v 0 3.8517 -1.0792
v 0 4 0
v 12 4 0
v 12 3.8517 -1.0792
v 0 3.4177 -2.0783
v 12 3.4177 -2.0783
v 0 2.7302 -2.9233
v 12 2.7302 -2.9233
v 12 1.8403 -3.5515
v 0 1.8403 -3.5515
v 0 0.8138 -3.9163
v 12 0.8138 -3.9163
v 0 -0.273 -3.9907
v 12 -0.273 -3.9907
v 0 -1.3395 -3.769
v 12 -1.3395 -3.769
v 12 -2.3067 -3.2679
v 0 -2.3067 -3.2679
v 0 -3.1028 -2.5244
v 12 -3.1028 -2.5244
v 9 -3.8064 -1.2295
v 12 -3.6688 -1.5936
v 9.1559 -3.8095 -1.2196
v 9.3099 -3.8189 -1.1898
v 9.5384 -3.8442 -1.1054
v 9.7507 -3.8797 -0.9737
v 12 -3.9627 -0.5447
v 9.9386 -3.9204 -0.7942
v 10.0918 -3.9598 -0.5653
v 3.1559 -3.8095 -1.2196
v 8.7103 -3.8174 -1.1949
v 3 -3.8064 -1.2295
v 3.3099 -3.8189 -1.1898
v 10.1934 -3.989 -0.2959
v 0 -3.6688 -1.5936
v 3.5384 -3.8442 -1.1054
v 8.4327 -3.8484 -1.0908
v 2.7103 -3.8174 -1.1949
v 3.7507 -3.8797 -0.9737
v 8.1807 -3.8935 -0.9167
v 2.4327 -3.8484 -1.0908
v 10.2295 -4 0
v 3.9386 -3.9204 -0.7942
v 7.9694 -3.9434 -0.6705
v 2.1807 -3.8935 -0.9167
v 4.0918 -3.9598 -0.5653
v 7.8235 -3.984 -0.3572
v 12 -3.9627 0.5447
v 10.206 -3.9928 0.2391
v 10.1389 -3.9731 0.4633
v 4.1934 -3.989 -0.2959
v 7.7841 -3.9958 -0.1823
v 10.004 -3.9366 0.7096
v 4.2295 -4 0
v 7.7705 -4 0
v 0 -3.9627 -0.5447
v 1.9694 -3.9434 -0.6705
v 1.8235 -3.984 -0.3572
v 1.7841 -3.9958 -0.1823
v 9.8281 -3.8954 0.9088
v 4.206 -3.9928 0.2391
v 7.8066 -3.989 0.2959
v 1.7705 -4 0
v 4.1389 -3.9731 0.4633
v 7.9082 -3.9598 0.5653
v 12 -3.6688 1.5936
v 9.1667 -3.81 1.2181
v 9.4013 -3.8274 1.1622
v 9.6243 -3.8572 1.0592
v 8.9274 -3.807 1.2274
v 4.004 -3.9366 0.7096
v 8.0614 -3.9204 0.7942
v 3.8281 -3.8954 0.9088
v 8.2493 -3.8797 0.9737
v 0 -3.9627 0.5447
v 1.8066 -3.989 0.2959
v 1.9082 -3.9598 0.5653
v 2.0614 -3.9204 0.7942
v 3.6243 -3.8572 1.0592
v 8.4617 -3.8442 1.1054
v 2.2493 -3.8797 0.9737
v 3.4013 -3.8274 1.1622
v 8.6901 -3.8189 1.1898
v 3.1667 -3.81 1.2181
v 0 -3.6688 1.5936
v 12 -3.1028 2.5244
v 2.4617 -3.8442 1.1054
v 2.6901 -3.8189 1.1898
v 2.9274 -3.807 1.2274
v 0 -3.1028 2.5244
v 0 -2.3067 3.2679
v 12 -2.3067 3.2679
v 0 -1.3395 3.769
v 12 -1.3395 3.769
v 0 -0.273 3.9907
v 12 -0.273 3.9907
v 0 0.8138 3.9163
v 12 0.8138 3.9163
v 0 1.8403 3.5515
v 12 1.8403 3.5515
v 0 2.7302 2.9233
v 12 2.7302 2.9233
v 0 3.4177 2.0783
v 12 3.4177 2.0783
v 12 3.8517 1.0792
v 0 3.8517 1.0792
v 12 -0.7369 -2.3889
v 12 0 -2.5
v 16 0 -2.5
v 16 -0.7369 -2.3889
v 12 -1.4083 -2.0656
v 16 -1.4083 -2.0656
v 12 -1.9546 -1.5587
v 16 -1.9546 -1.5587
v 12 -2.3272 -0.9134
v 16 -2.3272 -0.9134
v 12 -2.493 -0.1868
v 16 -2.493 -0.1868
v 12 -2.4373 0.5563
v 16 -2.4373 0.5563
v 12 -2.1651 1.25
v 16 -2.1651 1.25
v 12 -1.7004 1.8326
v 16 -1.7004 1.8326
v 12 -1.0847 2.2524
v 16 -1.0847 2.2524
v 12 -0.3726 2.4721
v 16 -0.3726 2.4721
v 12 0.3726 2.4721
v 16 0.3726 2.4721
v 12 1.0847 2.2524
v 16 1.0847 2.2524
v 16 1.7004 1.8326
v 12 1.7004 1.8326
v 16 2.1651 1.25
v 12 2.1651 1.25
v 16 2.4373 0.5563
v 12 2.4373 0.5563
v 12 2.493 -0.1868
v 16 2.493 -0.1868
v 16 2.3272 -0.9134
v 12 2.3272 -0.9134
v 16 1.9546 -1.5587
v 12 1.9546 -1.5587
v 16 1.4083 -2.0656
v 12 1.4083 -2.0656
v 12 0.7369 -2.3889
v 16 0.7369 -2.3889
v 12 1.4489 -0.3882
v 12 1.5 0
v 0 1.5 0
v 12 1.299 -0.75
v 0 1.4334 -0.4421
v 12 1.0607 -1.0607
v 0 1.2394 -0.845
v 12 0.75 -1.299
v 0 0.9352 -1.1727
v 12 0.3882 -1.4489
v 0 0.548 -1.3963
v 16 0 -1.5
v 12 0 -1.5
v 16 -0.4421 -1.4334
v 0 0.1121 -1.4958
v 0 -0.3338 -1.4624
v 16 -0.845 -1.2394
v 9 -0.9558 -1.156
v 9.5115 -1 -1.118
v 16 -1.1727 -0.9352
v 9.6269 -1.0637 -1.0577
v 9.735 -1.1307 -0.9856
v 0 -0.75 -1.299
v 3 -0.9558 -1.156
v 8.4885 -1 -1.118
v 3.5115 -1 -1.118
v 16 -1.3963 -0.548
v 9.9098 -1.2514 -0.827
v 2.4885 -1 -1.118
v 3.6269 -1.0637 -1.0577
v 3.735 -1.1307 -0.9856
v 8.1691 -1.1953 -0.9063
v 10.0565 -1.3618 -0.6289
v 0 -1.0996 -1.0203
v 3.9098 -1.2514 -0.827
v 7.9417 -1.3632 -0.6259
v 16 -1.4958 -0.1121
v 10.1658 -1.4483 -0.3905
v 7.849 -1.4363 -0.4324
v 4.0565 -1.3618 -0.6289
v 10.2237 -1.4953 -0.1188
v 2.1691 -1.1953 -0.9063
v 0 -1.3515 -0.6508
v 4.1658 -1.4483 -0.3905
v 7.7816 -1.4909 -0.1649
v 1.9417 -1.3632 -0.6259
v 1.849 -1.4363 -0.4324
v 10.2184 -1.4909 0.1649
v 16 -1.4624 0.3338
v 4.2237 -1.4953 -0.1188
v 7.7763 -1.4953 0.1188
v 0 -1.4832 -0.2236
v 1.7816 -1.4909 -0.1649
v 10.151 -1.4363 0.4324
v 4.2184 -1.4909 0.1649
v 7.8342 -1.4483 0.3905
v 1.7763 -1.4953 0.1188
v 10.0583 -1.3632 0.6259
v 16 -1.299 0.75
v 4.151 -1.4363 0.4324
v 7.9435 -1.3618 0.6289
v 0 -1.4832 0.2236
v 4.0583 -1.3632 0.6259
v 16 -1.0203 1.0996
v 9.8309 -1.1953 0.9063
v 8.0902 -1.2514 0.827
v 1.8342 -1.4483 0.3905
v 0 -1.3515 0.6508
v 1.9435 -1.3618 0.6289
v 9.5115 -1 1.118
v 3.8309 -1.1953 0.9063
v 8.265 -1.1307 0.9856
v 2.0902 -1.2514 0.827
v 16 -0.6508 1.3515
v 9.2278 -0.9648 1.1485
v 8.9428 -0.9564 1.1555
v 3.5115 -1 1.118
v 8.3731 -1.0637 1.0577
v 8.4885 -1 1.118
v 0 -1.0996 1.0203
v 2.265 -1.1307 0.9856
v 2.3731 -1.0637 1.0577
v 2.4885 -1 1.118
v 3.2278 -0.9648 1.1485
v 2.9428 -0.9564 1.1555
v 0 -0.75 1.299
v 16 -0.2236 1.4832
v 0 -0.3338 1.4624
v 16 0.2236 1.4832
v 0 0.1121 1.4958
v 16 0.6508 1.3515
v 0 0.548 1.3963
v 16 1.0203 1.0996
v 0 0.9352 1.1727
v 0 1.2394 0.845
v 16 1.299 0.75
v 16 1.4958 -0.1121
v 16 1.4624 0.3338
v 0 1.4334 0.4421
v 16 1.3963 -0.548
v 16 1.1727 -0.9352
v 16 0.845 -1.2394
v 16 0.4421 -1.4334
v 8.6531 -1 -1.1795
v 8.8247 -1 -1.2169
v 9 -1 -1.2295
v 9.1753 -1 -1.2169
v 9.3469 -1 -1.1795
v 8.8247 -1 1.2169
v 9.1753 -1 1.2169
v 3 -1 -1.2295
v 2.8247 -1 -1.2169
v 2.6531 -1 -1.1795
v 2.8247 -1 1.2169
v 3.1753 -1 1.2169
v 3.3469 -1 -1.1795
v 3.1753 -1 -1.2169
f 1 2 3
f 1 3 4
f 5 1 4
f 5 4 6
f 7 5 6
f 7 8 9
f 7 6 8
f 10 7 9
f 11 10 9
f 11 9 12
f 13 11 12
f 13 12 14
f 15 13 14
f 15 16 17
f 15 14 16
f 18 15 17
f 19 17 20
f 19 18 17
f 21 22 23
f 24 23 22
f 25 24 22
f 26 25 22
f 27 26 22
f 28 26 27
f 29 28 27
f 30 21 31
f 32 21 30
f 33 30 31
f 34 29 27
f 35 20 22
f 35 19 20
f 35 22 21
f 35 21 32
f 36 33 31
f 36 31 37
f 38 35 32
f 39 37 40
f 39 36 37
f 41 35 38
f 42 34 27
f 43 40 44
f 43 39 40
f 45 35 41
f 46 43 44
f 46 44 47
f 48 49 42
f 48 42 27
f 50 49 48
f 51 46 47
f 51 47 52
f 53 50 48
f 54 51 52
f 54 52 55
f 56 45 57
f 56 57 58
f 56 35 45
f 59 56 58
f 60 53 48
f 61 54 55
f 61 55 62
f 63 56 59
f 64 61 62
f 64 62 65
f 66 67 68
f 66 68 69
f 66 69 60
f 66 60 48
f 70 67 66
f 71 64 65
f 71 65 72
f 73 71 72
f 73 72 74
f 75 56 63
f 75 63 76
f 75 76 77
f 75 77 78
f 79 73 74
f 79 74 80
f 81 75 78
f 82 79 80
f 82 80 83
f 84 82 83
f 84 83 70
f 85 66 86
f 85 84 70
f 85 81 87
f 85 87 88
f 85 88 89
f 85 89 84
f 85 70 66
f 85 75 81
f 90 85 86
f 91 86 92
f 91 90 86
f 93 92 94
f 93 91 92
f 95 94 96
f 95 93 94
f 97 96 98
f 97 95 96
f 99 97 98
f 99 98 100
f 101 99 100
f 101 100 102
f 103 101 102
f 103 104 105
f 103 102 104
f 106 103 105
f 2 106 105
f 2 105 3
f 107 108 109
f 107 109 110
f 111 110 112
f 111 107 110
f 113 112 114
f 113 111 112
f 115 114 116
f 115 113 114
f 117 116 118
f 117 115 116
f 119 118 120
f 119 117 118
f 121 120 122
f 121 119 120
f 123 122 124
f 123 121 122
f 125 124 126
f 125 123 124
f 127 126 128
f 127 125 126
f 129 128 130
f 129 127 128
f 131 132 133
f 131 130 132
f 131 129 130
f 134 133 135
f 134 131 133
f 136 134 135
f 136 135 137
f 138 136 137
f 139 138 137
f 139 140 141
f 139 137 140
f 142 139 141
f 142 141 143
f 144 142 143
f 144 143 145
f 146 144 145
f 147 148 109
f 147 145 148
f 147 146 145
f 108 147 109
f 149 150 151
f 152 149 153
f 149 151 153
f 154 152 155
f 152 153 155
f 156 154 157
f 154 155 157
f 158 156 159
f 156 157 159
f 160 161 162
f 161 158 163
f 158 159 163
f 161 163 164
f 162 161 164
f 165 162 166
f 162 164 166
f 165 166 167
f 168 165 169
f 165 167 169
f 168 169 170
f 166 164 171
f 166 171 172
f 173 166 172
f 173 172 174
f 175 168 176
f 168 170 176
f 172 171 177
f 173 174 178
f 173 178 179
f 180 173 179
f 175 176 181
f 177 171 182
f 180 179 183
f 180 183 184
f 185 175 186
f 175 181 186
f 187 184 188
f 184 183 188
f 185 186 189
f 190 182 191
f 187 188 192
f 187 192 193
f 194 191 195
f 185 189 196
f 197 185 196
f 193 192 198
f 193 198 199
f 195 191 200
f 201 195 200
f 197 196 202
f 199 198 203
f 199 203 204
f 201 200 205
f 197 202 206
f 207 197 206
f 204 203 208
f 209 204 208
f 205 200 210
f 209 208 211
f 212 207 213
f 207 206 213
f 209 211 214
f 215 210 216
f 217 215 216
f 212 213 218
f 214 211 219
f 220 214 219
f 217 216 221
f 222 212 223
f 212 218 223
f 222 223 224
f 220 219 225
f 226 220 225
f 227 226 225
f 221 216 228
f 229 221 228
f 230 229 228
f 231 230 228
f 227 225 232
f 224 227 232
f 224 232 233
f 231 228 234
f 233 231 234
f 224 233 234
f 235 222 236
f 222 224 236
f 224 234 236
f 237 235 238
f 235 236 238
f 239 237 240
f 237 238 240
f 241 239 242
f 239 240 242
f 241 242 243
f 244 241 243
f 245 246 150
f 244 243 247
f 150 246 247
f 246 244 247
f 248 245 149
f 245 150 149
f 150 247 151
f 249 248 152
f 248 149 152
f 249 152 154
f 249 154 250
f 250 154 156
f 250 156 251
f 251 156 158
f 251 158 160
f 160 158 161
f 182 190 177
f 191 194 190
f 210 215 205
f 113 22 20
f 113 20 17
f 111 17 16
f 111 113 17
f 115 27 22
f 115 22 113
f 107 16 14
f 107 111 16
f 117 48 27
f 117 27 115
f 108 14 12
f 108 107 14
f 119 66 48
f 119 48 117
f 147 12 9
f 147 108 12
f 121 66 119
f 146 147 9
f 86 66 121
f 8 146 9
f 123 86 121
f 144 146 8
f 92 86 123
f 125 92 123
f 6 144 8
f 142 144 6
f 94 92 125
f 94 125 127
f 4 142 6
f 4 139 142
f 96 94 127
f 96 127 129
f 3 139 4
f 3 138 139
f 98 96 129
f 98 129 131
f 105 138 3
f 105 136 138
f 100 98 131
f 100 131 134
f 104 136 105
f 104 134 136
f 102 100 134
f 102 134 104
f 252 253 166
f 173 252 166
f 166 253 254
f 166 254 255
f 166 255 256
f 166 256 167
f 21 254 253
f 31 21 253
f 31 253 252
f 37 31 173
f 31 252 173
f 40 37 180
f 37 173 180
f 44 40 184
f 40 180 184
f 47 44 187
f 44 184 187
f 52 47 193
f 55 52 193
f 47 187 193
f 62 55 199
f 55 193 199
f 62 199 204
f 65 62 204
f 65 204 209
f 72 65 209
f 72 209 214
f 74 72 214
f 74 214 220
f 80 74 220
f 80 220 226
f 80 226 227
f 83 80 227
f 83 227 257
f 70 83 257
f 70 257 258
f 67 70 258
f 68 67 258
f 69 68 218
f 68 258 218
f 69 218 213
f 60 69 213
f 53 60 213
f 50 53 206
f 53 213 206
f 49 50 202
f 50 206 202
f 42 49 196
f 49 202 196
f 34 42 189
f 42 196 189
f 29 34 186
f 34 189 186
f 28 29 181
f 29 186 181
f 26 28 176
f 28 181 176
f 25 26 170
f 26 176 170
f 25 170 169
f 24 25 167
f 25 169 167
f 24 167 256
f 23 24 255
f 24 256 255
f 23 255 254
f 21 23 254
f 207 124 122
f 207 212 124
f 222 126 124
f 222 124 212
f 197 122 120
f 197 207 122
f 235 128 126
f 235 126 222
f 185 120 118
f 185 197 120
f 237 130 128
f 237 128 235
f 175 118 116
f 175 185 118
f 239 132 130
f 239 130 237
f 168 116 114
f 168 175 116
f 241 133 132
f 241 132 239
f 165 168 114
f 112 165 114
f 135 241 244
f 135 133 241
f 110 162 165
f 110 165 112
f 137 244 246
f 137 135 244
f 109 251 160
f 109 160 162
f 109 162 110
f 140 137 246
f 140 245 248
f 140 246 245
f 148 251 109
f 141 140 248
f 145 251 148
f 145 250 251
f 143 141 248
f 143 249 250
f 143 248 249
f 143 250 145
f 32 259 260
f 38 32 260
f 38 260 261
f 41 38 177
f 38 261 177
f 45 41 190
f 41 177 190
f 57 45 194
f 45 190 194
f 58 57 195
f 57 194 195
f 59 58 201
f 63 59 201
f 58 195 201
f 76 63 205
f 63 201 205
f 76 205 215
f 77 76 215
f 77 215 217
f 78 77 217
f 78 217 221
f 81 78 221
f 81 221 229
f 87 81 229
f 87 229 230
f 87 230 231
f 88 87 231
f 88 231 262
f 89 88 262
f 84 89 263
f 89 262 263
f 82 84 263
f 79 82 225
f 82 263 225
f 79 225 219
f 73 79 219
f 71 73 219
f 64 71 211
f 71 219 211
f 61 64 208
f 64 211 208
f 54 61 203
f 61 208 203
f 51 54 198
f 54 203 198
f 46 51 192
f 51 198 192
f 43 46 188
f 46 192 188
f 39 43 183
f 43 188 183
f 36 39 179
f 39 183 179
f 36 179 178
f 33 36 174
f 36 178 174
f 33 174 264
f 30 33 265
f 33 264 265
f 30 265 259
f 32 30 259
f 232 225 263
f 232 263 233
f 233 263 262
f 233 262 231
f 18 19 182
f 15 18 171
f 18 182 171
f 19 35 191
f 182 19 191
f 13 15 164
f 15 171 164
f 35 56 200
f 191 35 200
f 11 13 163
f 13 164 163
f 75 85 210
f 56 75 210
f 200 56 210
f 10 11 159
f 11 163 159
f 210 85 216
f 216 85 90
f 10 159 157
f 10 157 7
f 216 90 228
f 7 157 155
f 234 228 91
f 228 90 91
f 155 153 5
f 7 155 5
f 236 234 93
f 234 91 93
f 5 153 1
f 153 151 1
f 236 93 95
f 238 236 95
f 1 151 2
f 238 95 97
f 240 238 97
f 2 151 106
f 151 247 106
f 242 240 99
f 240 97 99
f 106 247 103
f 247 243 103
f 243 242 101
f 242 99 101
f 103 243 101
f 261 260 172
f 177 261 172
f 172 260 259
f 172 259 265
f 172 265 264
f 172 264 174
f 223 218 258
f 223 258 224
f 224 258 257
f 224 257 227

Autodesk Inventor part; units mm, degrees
ref_plane "YZ Plane" through (0, 0, 0) normal (1, 0, 0) x (0, 1, 0)
ref_plane "XY Plane" through (0, 0, 0) normal (0, 0, 1) x (1, 0, 0)
sketch "Эскиз1" plane through (0, 0, 0) normal (1, 0, 0) x (0, 1, 0)
  circle A0 centre (0, 0) radius 1.5
  circle A1 centre (0, 0) radius 4
  dimension "d0" = 3
  dimension "d1" = 8
extrude "Выдавливание1" add sketch "Эскиз1" along normal blind 12
sketch "Эскиз2" plane through (12, 0, 0) normal (1, 0, 0) x (0, 0, -1)
  circle A0 centre (0, 0) radius 1.5 projected
  circle A1 centre (0, 0) radius 4 projected
  circle A2 centre (0, 0) radius 2.5
  dimension "d4" = 5
extrude "Выдавливание2" add sketch "Эскиз2" along normal blind 4 contours A2
ref_plane "РабПлоскость1" through (0, -4, 0) normal (0, 1, 0) x (-1, 0, 0)
sketch "Эскиз3" plane through (0, -4, 0) normal (0, 1, 0) x (-1, 0, 0)
  point P0 (0, 0)
  point P1 (-3, 0)
  point P2 (-9, 0)
  dimension "d7" = 3
  dimension "d8" = 6
hole "Отверстие1" at (3, -4, 0) at (9, -4, 0) direction (0, 1, 0) diameter 2.459 depth 3 tip angle 118 thread size "M3x0.5" class "6H" standard "ISO Metric profile"
properties part number "Vtulka"
